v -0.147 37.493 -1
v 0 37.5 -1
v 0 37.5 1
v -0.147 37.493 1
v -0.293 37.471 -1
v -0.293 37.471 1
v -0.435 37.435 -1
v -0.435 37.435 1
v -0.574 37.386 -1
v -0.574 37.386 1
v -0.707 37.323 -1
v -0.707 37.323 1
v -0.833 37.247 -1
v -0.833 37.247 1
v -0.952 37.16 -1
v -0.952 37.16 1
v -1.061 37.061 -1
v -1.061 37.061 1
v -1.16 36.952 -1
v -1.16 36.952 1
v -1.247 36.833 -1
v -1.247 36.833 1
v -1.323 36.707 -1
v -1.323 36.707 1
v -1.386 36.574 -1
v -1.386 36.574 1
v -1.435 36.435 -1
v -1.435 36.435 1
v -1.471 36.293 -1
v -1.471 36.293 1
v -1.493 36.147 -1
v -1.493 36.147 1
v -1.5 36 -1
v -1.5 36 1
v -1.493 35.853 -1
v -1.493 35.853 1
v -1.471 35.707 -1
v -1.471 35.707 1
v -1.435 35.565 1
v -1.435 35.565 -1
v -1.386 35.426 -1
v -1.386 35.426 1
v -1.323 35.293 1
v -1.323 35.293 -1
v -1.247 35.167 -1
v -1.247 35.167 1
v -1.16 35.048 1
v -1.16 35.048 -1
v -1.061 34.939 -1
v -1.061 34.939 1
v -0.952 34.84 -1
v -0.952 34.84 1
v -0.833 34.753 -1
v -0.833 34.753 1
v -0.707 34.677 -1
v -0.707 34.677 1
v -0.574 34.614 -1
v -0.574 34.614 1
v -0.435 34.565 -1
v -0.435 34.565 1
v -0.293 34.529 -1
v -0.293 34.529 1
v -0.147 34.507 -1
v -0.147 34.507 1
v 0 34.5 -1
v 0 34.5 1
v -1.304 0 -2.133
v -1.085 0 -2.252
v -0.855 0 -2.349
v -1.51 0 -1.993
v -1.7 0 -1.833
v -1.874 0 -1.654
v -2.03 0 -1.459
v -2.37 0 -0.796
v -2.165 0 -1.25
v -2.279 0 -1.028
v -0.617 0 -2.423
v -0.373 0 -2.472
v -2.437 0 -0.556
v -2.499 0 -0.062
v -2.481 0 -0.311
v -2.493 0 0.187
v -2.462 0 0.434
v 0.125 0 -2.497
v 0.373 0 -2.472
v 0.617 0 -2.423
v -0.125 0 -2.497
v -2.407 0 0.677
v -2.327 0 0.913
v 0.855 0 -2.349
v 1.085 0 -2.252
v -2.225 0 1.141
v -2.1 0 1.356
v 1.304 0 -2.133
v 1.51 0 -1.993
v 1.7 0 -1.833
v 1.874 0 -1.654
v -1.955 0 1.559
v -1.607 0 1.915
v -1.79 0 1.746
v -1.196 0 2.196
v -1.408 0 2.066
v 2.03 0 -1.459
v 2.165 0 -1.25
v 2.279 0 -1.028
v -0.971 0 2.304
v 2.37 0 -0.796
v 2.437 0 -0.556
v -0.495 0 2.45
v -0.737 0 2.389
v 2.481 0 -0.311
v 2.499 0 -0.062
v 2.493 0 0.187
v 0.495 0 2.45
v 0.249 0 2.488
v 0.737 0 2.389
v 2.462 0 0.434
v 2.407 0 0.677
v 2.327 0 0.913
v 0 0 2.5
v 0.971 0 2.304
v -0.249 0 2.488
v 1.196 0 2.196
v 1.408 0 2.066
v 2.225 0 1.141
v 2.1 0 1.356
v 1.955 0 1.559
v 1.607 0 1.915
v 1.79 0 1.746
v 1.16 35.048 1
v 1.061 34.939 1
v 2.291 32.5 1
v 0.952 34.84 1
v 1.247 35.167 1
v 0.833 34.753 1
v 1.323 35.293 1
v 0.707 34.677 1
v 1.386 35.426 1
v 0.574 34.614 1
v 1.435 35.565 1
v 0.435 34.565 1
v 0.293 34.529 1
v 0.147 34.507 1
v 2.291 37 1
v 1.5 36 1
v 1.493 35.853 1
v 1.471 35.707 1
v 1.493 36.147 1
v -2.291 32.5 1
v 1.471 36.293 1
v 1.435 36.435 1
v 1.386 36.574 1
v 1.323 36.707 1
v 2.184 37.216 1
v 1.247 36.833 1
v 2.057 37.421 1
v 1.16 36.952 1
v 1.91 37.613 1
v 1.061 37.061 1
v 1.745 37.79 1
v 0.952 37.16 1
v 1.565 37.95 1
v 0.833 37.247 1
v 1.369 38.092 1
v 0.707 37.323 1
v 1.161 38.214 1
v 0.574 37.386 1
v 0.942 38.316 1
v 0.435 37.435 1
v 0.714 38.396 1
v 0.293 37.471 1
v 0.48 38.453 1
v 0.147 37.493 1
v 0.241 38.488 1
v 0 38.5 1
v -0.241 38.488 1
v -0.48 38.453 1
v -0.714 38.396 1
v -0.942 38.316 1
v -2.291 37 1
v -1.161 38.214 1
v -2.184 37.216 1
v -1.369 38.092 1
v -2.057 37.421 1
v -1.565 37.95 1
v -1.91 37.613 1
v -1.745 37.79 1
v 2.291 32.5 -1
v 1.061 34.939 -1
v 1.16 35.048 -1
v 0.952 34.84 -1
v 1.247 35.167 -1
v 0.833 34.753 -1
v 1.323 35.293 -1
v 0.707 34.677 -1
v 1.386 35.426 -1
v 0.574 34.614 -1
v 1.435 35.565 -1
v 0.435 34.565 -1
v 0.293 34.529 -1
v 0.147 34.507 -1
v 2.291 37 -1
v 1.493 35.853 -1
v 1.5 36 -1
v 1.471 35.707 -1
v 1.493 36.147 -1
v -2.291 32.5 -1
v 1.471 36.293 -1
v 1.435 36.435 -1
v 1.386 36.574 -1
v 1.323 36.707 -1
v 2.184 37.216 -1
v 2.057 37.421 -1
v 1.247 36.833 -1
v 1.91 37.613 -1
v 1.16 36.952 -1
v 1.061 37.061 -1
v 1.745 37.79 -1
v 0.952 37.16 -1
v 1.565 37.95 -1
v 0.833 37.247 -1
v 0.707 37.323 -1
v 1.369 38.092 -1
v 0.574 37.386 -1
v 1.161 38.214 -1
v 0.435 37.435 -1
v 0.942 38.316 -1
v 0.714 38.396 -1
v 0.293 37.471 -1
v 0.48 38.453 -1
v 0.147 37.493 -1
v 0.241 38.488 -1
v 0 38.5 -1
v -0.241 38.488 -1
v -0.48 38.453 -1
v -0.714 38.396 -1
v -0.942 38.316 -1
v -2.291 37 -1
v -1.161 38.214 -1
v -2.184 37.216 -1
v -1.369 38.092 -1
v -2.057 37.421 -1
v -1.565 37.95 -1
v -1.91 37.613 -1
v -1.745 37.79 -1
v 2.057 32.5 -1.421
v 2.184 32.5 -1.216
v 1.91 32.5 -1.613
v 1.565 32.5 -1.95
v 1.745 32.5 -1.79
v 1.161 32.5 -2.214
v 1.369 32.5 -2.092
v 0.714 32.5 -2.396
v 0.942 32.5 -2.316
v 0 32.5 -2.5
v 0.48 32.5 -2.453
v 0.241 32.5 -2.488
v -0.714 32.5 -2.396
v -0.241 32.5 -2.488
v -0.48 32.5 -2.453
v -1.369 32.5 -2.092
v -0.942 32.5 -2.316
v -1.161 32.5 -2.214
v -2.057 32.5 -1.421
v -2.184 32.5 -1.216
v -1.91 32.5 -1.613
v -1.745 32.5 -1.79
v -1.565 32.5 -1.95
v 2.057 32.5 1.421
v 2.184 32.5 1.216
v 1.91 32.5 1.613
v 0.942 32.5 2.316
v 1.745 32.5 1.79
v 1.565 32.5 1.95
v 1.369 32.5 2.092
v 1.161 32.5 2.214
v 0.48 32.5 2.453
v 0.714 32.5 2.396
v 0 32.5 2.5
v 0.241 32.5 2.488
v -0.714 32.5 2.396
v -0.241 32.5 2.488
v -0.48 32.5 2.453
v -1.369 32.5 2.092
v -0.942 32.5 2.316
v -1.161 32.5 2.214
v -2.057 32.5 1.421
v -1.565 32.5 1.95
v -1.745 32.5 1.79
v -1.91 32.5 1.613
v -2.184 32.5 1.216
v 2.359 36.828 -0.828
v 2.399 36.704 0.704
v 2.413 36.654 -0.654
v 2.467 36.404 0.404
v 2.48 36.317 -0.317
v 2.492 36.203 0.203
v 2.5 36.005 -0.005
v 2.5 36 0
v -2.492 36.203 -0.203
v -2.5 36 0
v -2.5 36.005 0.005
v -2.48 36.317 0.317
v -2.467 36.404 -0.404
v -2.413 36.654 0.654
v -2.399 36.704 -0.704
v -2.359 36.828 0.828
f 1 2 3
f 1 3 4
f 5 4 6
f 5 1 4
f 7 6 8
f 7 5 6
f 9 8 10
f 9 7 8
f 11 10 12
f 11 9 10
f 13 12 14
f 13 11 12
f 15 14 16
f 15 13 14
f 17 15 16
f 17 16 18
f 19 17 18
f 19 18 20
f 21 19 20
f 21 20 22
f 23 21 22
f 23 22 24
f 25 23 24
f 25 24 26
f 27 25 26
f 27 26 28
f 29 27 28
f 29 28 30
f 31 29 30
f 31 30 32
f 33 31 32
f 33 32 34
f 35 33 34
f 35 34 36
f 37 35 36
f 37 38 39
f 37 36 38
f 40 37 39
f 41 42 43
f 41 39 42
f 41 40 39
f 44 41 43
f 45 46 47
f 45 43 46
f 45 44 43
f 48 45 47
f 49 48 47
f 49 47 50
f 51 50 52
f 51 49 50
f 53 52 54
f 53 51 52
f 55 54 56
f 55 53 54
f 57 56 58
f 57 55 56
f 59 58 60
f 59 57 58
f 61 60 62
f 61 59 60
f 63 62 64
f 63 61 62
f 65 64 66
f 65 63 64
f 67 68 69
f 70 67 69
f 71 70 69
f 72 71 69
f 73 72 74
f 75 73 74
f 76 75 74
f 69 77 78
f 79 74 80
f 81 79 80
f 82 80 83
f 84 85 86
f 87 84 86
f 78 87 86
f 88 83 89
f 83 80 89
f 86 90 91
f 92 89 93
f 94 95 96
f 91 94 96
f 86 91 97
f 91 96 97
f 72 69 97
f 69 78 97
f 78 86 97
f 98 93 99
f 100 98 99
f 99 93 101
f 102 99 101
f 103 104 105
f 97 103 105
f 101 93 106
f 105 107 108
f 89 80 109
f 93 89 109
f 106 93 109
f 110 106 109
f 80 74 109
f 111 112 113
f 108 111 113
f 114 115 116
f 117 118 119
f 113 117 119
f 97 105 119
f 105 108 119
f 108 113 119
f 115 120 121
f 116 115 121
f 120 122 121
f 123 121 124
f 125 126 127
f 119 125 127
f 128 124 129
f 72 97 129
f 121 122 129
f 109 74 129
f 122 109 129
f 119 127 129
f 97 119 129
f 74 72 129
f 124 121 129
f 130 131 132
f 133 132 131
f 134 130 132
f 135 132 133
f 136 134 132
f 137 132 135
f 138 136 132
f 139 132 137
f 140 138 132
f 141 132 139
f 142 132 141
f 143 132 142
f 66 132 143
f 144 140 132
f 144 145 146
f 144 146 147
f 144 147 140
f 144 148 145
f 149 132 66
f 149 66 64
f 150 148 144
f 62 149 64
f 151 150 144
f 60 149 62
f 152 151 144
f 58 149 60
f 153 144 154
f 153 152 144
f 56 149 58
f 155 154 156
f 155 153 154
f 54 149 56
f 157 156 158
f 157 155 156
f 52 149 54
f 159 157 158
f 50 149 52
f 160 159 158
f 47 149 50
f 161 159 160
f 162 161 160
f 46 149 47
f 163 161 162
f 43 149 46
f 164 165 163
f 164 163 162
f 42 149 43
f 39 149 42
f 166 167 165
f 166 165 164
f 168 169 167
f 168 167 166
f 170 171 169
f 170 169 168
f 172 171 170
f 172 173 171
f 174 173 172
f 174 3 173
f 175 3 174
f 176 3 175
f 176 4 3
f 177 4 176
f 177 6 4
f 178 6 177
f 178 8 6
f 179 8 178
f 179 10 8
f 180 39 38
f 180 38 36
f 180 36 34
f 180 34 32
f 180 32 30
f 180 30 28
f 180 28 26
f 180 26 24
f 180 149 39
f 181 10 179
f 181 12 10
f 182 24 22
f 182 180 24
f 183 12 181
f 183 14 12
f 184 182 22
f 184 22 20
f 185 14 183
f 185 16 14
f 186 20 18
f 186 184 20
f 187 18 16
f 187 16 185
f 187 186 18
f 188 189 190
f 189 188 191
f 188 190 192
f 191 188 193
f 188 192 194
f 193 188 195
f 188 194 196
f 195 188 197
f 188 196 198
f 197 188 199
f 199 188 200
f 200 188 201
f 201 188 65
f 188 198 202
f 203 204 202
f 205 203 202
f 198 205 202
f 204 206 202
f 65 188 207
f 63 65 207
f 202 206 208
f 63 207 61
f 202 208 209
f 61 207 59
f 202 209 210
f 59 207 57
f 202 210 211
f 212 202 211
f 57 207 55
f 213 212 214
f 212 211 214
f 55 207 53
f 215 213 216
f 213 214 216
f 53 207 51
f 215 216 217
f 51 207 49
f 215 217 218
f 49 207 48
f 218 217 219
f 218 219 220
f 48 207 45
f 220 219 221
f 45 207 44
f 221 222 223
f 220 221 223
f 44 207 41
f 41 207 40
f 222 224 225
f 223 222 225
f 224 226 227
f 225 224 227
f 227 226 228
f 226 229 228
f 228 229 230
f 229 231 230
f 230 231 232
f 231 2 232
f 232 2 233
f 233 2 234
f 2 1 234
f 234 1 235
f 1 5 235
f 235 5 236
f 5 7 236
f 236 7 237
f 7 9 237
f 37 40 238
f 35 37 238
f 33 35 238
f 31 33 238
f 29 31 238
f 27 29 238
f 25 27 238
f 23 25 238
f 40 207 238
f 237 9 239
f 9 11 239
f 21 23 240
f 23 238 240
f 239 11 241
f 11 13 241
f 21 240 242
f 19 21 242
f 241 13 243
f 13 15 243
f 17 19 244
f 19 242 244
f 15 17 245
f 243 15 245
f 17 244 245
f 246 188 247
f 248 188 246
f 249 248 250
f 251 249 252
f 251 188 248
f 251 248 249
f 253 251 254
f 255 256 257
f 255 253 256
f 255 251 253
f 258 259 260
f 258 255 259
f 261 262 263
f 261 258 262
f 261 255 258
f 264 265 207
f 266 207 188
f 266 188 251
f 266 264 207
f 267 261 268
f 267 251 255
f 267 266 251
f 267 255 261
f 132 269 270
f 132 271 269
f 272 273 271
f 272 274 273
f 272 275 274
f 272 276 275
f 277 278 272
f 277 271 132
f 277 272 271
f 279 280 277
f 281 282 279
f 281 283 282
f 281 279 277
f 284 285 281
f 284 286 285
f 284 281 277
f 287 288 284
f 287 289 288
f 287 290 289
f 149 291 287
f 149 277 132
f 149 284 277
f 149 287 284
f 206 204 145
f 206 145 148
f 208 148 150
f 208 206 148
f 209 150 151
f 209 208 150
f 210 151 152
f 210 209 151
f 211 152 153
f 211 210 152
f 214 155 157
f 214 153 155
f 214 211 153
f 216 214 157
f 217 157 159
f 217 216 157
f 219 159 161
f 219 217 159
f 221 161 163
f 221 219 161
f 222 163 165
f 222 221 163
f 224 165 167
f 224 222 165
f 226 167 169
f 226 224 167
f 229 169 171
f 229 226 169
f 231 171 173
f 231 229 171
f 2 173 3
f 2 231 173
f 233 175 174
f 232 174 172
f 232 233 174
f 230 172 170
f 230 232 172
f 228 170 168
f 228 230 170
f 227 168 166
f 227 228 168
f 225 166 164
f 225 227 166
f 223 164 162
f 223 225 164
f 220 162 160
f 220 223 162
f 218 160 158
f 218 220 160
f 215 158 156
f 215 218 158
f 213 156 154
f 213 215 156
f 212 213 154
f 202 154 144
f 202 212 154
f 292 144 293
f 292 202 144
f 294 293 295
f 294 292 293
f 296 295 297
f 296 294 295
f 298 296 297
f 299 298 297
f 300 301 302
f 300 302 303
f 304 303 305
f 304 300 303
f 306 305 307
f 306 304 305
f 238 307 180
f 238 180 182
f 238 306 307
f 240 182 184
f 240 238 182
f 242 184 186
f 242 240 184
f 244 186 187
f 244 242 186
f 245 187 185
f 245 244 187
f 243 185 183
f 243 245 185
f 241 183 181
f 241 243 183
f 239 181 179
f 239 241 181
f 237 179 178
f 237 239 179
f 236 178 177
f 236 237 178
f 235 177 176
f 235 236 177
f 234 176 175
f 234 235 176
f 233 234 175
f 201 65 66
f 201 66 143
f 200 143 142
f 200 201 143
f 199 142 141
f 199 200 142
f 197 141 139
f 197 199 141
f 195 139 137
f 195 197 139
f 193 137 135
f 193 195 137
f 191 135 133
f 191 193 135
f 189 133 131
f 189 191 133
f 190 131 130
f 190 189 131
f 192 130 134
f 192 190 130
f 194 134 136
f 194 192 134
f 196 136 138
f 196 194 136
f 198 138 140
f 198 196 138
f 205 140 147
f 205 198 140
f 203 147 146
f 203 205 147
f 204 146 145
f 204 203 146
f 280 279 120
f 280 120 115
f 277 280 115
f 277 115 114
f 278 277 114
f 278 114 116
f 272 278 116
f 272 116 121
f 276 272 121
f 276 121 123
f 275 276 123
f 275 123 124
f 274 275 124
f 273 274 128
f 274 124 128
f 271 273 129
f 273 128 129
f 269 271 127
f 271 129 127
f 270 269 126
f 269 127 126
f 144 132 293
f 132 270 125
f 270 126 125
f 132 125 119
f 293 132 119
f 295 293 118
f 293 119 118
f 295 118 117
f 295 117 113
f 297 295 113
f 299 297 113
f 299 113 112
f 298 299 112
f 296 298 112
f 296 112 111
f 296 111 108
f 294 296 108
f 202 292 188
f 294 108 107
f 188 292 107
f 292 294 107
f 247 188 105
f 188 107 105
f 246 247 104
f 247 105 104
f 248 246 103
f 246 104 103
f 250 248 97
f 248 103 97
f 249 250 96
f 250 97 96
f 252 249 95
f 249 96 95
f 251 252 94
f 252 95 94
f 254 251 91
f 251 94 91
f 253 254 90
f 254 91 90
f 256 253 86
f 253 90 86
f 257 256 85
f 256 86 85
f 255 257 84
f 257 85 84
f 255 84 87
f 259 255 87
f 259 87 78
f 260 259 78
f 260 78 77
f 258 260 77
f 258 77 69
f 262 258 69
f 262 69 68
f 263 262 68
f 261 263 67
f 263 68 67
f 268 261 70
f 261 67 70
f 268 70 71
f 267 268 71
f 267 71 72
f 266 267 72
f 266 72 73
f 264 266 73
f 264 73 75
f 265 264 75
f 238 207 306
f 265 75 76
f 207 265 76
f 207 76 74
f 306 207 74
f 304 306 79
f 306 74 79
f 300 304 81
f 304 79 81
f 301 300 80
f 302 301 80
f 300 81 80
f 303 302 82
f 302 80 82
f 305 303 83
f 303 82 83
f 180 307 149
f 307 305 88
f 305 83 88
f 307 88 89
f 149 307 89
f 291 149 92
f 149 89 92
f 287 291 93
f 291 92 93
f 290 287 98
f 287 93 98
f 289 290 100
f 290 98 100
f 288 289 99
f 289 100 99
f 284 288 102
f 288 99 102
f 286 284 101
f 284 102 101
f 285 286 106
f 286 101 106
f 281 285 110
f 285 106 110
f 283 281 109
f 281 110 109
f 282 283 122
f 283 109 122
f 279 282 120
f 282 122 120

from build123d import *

# Parameters (mm, degrees)
SKETCH_1_R               = 2.5
EXTRUDE_1_DEPTH          = 38.5
CUT_EXTRUDE_1_DEPTH      = 39.661996844
CUT_EXTRUDE_1_DEPTH_BACK = 39.661996844
CUT_EXTRUDE_2_DEPTH      = 39.661996957
CUT_EXTRUDE_2_DEPTH_BACK = 39.661996957
SKETCH_3_W               = 1.5
SKETCH_3_H               = 6


with BuildPart() as part:
    # 草图1 → 凸台-拉伸1 (new body)
    with BuildSketch(Plane(origin=(0, 0, 0), x_dir=(1, 0, 0), z_dir=(0, 1, 0))):
        with Locations(Location((0, 0, 0), (0, 0, 270))):
            Circle(SKETCH_1_R)
    extrude(amount=EXTRUDE_1_DEPTH)

    # 草图2 → 切除-拉伸1 (cut, two sides: drawn at the far end of the back side and taken through both)
    with BuildSketch(Plane.XY.offset(-CUT_EXTRUDE_1_DEPTH_BACK)):
        with BuildLine():
            ThreePointArc((-2.5, 36), (-1.767766953, 37.767766953), (0, 38.5))
            Line((0, 38.5), (-2.5, 38.5))
            Line((-2.5, 38.5), (-2.5, 36))
        make_face()
        with BuildLine():
            Line((2.5, 38.5), (0, 38.5))
            ThreePointArc((0, 38.5), (1.767766953, 37.767766953), (2.5, 36))
            Line((2.5, 36), (2.5, 38.5))
        make_face()
        with BuildLine():
            ThreePointArc((1.5, 36), (1.060660172, 37.060660172), (0, 37.5))
            Line((0, 37.5), (0, 34.5))
            ThreePointArc((0, 34.5), (1.060660172, 34.939339828), (1.5, 36))
        make_face()
        with BuildLine():
            Line((0, 34.5), (0, 37.5))
            ThreePointArc((0, 37.5), (-1.5, 36), (0, 34.5))
        make_face()
    extrude(amount=CUT_EXTRUDE_1_DEPTH + CUT_EXTRUDE_1_DEPTH_BACK, mode=Mode.SUBTRACT)

    # 草图3 → 切除-拉伸2 (cut, two sides: drawn at the far end of the back side and taken through both)
    with BuildSketch(Plane(origin=(0, 0, 0), x_dir=(0, 0, -1), z_dir=(1, 0, 0)).offset(-CUT_EXTRUDE_2_DEPTH_BACK)):
        with Locations((-1.75, 35.5)):
            Rectangle(SKETCH_3_W, SKETCH_3_H)
        with Locations((1.75, 35.5)):
            Rectangle(SKETCH_3_W, SKETCH_3_H)
    extrude(amount=CUT_EXTRUDE_2_DEPTH + CUT_EXTRUDE_2_DEPTH_BACK, mode=Mode.SUBTRACT)


solid = part.part
